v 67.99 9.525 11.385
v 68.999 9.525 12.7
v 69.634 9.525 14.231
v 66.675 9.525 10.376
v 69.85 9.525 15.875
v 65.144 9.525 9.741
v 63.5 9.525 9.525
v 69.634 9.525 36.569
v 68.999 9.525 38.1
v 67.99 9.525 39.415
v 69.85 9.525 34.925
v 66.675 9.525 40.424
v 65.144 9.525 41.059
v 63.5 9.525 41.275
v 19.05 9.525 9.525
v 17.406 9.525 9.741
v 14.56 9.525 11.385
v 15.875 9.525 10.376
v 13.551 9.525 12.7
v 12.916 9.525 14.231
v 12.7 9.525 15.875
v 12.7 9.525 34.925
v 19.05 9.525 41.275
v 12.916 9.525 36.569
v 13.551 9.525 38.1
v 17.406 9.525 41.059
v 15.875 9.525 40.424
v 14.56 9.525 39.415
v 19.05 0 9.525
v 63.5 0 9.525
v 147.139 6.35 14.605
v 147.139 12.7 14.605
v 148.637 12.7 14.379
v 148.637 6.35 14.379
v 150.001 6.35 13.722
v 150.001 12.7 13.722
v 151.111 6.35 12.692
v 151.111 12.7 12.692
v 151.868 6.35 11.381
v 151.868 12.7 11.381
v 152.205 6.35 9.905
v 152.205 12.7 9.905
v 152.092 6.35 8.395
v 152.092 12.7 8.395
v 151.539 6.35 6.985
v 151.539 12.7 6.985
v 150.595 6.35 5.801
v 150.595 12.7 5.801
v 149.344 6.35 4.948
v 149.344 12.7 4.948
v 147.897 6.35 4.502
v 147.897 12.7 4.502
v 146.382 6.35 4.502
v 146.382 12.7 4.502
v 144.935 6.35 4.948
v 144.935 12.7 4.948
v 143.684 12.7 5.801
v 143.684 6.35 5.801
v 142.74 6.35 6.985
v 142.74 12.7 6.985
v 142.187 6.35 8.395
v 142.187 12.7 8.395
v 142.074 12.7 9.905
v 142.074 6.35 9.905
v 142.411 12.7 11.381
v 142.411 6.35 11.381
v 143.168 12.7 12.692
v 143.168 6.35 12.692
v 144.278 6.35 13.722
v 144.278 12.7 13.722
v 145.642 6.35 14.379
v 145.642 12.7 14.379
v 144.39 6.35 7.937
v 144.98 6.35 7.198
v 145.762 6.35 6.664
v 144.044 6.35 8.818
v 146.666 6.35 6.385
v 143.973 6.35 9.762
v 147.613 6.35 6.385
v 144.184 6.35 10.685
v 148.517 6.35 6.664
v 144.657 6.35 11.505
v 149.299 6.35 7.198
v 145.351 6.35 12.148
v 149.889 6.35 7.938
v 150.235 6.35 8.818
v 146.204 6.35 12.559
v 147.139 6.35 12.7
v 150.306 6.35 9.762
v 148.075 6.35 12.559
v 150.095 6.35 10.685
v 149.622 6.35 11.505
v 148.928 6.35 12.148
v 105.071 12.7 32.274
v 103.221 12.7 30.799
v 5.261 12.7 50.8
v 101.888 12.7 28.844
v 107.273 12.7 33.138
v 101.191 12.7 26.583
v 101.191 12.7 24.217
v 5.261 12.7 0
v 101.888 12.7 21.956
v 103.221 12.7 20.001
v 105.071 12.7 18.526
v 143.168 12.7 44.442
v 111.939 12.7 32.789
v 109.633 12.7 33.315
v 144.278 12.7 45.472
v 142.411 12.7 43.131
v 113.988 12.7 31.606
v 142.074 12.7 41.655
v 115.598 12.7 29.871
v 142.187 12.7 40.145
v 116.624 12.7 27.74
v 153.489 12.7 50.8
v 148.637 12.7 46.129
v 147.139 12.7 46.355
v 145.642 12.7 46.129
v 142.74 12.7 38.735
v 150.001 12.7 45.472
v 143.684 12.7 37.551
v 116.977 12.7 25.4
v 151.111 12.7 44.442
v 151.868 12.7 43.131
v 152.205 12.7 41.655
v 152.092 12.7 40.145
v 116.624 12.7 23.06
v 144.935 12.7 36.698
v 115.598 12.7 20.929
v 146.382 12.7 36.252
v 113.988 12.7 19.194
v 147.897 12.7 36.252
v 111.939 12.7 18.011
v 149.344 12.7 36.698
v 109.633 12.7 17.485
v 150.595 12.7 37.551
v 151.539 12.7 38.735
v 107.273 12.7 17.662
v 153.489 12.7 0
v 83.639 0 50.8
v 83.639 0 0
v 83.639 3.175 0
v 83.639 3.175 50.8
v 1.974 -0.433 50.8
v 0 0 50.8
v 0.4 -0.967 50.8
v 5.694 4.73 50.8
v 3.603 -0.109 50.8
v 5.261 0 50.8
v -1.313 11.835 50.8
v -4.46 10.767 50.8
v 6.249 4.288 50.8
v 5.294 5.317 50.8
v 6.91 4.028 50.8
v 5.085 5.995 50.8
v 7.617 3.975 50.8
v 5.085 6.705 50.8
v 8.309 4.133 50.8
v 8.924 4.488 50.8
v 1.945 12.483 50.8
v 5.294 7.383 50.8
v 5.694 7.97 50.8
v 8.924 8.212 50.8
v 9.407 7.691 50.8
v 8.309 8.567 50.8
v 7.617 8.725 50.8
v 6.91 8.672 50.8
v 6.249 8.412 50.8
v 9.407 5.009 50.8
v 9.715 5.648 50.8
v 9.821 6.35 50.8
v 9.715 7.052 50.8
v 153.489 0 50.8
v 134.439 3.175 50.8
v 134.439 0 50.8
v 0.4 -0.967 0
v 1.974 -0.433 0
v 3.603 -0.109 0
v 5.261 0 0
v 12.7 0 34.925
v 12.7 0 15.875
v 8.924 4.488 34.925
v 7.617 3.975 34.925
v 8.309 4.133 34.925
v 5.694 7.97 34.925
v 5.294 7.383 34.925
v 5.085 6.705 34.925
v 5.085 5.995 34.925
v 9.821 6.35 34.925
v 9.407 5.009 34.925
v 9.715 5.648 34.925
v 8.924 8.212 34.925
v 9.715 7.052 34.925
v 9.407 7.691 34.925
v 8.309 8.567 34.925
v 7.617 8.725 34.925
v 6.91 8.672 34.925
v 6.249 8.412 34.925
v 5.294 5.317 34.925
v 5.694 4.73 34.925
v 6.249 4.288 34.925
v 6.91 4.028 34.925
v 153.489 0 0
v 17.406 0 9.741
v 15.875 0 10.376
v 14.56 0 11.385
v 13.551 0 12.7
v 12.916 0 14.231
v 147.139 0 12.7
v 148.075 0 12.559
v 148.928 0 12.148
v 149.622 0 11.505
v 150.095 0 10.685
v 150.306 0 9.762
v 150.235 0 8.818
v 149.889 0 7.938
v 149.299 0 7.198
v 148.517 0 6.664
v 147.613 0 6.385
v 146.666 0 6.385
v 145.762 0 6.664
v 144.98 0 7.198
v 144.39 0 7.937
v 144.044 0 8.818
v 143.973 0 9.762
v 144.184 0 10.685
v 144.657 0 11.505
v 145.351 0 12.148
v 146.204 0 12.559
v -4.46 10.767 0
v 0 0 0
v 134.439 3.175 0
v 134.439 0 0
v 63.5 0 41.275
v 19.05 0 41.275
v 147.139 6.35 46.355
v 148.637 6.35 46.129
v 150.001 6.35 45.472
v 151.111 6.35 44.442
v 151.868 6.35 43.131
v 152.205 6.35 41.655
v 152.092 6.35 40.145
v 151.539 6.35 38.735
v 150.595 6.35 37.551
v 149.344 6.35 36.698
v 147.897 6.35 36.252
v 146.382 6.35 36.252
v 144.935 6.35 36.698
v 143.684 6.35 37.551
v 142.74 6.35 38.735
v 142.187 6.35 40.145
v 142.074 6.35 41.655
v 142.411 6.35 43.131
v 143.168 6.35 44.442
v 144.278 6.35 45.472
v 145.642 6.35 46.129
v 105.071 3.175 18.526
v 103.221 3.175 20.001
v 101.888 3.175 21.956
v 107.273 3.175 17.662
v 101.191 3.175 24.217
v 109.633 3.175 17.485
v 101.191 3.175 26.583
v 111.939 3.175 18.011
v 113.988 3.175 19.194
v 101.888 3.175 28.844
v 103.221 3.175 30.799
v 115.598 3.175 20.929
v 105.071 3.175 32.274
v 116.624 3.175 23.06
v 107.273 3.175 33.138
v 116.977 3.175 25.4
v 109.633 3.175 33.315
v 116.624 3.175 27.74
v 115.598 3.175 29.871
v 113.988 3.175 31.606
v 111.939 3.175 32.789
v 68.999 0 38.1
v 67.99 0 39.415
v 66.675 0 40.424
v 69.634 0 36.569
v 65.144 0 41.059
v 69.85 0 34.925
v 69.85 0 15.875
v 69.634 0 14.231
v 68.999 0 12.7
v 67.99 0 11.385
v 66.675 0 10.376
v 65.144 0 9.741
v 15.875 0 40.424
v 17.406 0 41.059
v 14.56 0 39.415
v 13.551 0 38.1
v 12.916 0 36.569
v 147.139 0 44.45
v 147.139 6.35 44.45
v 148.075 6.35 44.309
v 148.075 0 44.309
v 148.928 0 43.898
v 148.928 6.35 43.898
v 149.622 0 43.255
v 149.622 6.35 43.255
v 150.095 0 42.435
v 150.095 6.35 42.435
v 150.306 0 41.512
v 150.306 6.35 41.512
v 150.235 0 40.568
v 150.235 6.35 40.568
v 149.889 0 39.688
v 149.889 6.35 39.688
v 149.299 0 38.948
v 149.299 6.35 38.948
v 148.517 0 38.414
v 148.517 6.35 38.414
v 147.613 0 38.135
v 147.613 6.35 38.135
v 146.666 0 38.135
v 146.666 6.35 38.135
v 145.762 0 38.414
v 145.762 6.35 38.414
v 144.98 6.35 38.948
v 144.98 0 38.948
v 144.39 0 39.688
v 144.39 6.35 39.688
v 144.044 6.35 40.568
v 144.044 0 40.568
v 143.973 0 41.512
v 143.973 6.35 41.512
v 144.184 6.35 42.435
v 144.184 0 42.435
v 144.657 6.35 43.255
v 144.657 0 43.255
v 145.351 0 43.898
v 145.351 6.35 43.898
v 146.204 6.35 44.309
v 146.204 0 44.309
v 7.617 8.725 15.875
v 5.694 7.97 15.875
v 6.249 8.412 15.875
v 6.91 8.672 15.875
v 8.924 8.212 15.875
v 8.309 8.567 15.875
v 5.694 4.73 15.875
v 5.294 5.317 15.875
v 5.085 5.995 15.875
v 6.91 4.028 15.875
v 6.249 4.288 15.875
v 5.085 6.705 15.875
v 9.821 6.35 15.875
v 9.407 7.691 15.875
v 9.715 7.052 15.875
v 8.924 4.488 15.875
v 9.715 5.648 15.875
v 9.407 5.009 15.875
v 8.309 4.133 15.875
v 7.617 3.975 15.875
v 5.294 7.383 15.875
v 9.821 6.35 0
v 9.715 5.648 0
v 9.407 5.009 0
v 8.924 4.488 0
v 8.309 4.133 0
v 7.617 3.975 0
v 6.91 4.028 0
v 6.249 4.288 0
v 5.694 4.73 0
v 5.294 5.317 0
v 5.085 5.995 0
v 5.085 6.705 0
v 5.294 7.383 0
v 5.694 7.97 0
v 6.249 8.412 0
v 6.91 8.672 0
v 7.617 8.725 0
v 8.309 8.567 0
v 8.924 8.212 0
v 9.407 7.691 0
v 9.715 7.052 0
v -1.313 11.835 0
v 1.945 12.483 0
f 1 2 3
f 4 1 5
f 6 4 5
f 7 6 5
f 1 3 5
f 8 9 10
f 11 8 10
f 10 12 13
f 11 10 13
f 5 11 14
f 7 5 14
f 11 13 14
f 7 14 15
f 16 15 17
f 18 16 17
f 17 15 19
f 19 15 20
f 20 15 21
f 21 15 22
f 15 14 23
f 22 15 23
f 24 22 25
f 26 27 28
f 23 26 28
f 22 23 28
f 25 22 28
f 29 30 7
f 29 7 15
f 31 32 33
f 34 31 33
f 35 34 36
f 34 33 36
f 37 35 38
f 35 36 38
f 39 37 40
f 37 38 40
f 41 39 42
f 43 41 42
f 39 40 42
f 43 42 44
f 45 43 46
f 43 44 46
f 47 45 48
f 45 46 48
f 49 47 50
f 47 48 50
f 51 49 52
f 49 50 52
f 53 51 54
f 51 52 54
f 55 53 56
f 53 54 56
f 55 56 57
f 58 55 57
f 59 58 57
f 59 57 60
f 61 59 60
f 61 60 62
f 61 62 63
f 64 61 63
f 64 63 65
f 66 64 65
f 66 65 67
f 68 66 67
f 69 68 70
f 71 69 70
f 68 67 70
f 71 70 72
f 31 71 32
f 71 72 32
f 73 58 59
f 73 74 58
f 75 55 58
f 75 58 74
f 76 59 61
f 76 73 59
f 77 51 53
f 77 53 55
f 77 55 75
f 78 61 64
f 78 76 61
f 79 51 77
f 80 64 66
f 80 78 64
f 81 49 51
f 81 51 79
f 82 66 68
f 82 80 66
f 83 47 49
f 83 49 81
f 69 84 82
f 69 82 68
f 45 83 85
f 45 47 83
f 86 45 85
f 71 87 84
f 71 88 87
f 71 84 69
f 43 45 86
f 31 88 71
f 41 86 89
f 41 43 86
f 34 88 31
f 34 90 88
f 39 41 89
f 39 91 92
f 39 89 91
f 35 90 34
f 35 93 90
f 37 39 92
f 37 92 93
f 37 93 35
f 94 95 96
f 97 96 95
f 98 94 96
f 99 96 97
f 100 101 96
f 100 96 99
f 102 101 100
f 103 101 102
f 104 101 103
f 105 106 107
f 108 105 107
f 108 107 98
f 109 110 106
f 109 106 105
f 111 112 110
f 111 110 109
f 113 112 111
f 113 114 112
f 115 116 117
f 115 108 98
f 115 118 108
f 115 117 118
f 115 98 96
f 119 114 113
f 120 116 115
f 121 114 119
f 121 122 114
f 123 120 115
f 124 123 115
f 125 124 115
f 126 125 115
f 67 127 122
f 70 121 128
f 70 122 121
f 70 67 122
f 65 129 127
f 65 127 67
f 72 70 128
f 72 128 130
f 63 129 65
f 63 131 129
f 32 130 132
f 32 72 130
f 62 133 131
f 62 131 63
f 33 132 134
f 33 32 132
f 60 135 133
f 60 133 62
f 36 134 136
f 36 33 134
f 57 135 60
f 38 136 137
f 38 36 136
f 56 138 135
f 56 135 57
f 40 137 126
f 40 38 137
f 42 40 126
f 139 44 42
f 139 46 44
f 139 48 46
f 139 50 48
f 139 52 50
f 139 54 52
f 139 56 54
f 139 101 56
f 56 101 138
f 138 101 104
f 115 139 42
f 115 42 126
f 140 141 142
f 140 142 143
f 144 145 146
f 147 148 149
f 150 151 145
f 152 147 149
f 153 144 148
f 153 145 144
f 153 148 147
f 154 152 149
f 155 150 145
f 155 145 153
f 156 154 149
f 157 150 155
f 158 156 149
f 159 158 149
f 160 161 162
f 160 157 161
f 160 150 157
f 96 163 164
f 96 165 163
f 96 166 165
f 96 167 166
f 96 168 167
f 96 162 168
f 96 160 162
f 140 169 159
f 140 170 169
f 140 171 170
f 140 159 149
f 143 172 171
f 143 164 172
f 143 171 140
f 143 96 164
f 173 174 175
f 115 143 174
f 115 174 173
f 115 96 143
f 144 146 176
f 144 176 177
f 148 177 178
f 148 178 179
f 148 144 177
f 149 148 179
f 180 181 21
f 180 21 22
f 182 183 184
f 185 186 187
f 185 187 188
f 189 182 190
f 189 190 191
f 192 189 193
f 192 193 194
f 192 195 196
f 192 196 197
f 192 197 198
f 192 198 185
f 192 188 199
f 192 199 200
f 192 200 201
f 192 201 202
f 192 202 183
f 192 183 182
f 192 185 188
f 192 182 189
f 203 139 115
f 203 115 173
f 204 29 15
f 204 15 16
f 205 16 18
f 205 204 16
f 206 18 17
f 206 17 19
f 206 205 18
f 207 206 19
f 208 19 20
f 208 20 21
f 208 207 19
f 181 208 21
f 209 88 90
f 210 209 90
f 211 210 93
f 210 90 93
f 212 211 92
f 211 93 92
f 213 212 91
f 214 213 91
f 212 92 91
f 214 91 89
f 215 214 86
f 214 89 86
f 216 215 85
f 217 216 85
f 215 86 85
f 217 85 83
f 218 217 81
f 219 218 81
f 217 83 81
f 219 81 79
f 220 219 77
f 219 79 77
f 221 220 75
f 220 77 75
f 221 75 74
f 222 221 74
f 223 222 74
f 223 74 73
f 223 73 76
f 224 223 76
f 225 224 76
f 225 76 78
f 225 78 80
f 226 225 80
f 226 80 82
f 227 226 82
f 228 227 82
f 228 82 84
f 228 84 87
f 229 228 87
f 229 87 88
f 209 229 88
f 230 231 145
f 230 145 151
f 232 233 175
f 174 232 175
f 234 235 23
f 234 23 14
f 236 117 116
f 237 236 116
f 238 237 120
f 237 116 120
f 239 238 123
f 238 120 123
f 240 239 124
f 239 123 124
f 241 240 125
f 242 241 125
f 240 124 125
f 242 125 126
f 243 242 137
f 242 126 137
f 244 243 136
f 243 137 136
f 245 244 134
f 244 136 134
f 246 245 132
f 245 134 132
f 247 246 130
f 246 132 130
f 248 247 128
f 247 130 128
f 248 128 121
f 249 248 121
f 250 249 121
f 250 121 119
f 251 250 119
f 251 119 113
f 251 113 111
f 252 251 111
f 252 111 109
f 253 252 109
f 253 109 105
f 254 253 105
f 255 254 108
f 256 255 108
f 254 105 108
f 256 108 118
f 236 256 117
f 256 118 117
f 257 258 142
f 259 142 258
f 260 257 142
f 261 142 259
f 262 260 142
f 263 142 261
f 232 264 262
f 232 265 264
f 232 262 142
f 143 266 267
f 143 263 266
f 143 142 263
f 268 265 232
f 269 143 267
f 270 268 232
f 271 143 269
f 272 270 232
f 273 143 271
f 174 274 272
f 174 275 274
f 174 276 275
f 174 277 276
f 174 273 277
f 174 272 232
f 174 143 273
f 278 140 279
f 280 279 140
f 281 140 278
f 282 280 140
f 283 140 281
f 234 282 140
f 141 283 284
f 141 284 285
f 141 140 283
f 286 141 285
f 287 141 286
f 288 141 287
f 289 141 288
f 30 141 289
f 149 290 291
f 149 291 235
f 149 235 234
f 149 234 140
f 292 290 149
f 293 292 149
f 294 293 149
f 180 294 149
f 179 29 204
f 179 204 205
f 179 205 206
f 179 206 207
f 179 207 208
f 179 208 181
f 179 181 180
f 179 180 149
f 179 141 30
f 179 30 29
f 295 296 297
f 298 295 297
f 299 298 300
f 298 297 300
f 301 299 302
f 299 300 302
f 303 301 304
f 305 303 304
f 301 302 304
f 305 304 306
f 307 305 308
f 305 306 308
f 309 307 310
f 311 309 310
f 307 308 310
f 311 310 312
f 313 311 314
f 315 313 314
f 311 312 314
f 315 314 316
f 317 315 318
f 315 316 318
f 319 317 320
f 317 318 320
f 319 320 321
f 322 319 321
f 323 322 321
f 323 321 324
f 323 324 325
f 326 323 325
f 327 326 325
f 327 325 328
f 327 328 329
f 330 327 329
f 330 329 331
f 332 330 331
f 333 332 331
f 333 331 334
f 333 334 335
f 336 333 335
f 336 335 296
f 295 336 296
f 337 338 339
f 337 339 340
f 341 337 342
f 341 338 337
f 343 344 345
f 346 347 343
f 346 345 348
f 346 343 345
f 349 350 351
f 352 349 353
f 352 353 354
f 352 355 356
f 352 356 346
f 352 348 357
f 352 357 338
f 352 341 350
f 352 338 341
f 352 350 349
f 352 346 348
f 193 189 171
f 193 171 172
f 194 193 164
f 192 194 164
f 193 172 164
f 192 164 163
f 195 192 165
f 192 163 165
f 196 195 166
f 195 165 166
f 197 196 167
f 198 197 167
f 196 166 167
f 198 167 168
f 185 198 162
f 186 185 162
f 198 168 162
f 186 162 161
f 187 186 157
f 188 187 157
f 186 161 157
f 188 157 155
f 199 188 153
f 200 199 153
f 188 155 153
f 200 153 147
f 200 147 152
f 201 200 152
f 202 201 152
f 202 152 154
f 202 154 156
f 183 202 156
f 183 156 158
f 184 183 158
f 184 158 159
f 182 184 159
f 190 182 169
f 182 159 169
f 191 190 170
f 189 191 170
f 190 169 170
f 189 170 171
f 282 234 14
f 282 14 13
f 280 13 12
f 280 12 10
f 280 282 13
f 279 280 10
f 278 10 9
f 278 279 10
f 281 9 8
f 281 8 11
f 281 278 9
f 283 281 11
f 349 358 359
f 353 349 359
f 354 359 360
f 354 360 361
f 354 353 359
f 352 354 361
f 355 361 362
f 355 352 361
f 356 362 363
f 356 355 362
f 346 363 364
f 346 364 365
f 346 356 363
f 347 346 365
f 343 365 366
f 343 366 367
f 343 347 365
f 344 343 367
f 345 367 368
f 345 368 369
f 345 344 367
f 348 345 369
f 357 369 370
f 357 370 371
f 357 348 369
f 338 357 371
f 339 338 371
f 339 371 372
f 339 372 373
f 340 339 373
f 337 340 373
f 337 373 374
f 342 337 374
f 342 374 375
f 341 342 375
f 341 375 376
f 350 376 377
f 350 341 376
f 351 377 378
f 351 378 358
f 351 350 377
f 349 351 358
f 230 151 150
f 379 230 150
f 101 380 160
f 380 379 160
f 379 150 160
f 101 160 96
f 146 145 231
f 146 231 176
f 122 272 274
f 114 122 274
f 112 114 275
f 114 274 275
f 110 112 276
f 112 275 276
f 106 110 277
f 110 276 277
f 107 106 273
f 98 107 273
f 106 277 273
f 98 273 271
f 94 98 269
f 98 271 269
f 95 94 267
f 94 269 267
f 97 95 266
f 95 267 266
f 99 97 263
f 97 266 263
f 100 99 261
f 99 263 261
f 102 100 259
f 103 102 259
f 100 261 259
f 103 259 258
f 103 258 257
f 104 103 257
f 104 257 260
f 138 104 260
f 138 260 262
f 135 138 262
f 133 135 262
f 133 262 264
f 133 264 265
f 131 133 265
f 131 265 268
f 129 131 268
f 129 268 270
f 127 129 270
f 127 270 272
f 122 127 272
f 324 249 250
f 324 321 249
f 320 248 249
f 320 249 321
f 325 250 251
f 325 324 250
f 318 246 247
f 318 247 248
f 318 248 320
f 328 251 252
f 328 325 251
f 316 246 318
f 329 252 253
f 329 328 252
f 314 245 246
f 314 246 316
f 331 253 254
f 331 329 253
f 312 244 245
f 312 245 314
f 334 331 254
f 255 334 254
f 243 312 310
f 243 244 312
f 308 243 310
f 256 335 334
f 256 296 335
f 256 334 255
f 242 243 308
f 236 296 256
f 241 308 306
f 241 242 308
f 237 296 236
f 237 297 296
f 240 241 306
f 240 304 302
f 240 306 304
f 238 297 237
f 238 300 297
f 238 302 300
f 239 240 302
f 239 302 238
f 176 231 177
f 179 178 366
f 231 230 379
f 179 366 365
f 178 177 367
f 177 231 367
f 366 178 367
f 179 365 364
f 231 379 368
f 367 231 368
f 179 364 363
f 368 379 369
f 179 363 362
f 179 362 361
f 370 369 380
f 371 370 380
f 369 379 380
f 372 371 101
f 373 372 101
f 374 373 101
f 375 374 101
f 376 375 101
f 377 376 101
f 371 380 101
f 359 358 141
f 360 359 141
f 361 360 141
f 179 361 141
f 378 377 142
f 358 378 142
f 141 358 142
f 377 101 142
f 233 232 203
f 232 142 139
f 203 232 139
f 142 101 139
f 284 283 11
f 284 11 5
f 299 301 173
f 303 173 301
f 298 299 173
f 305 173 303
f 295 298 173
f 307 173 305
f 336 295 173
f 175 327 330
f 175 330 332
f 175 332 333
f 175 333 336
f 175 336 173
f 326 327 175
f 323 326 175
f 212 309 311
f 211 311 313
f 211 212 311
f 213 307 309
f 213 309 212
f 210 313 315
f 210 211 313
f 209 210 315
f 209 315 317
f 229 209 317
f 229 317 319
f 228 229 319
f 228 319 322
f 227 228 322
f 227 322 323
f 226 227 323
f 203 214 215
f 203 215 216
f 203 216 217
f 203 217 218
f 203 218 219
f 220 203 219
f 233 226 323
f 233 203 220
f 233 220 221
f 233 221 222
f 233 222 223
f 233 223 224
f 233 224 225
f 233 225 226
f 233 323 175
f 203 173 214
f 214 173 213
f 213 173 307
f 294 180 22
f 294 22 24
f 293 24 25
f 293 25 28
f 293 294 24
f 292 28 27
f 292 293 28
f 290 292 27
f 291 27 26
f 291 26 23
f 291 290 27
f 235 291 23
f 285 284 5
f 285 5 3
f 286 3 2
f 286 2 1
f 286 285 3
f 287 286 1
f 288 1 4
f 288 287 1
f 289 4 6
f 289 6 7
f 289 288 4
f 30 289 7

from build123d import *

# Parameters (mm, degrees)
EXTRUDE1_DEPTH     = 50.8
CUT_EXTRUDE1_DEPTH = 9.525
SKETCH3_R          = 7.9375
CUT_EXTRUDE2_DEPTH = 163.175685145
SKETCH4_W          = 50.8
SKETCH4_H          = 50.8
CUT_EXTRUDE3_DEPTH = 3.175
SKETCH5_R          = 2.38125
CUT_EXTRUDE4_DEPTH = 15.875
CUT_EXTRUDE5_START = -15.875
SKETCH6_R          = 2.38125
CUT_EXTRUDE5_DEPTH = 15.875
SKETCH7_R          = 3.175
CUT_EXTRUDE6_DEPTH = 163.175685145
SKETCH8_R          = 5.08
CUT_EXTRUDE7_DEPTH = 6.35
CUT_EXTRUDE8_DEPTH = 163.175685145
EXTRUDE2_DEPTH     = 50.8


with BuildPart() as part:
    # Sketch1 → Extrude1 (new body)
    with BuildSketch(Plane.XY):
        Polygon((0, 0), (-5.260512242, 12.7), (153.489487758, 12.7), (153.489487758, 0), align=None)
    extrude(amount=EXTRUDE1_DEPTH)

    # Sketch2 → Cut-Extrude1 (cut)
    with BuildSketch(Plane.XZ):
        with BuildLine():
            Line((19.05, 41.275), (63.5, 41.275))
            ThreePointArc((63.5, 41.275), (67.990128061, 39.415128061), (69.85, 34.925))
            Line((69.85, 34.925), (69.85, 15.875))
            ThreePointArc((69.85, 15.875), (67.990128061, 11.384871939), (63.5, 9.525))
            Line((63.5, 9.525), (19.05, 9.525))
            ThreePointArc((19.05, 9.525), (14.559871939, 11.384871939), (12.7, 15.875))
            Line((12.7, 15.875), (12.7, 34.925))
            ThreePointArc((12.7, 34.925), (14.559871939, 39.415128061), (19.05, 41.275))
        make_face()
    extrude(amount=-CUT_EXTRUDE1_DEPTH, mode=Mode.SUBTRACT)

    # Sketch3 → Cut-Extrude2 (cut, through all)
    with BuildSketch(Plane.XZ):
        with Locations((109.039487758, 25.4)):
            Circle(SKETCH3_R)
    extrude(amount=-CUT_EXTRUDE2_DEPTH, mode=Mode.SUBTRACT)

    # Sketch4 → Cut-Extrude3 (cut)
    with BuildSketch(Plane.XZ):
        with Locations((109.039487758, 25.4)):
            Rectangle(SKETCH4_W, SKETCH4_H)
    extrude(amount=-CUT_EXTRUDE3_DEPTH, mode=Mode.SUBTRACT)

    # Sketch5 → Cut-Extrude4 (cut)
    with BuildSketch(Plane.XY.offset(50.8)):
        with Locations((7.439487758, 6.35)):
            Circle(SKETCH5_R)
    extrude(amount=-CUT_EXTRUDE4_DEPTH, mode=Mode.SUBTRACT)

    # Sketch6 → Cut-Extrude5 (cut)
    with BuildSketch(Plane(origin=(0, 0, 0), x_dir=(-1, 0, 0), z_dir=(0, 0, -1)).offset(CUT_EXTRUDE5_START)):
        with Locations(Location((-7.439487758, 6.35, 0), (0, 0, 180))):
            Circle(SKETCH6_R)
    extrude(amount=CUT_EXTRUDE5_DEPTH, mode=Mode.SUBTRACT)

    # Sketch7 → Cut-Extrude6 (cut, through all)
    with BuildSketch(Plane(origin=(0, 12.7, 0), x_dir=(-1, 0, 0), z_dir=(0, 1, 0))):
        with Locations(Location((-147.139487758, 9.525, 0), (0, 0, 90))):
            Circle(SKETCH7_R)
        with Locations(Location((-147.139487758, 41.275, 0), (0, 0, 90))):
            Circle(SKETCH7_R)
    extrude(amount=-CUT_EXTRUDE6_DEPTH, mode=Mode.SUBTRACT)

    # Sketch8 → Cut-Extrude7 (cut)
    with BuildSketch(Plane(origin=(0, 12.7, 0), x_dir=(-1, 0, 0), z_dir=(0, 1, 0))):
        with Locations(Location((-147.139487758, 9.525, 0), (0, 0, 90))):
            Circle(SKETCH8_R)
        with Locations(Location((-147.139487758, 41.275, 0), (0, 0, 90))):
            Circle(SKETCH8_R)
    extrude(amount=-CUT_EXTRUDE7_DEPTH, mode=Mode.SUBTRACT)

    # Sketch9 → Cut-Extrude8 (cut, through all)
    with BuildSketch(Plane.XY.offset(50.8)):
        with BuildLine():
            Line((5.260512242, 12.7), (-5.260512242, 12.7))
            Line((-5.260512242, 12.7), (-4.45964694, 10.766540126))
            ThreePointArc((-4.45964694, 10.766540126), (0.305218063, 12.211946122), (5.260512242, 12.7))
        make_face()
    extrude(amount=-CUT_EXTRUDE8_DEPTH, mode=Mode.SUBTRACT)

    # Sketch10 → Extrude2 (add)
    with BuildSketch(Plane.XY.offset(50.8)):
        with BuildLine():
            Line((0, 0), (0.400432651, -0.966729937))
            ThreePointArc((0.400432651, -0.966729937), (2.782865153, -0.244026939), (5.260512242, 0))
            Line((5.260512242, 0), (0, 0))
        make_face()
    extrude(amount=-EXTRUDE2_DEPTH)


solid = part.part
